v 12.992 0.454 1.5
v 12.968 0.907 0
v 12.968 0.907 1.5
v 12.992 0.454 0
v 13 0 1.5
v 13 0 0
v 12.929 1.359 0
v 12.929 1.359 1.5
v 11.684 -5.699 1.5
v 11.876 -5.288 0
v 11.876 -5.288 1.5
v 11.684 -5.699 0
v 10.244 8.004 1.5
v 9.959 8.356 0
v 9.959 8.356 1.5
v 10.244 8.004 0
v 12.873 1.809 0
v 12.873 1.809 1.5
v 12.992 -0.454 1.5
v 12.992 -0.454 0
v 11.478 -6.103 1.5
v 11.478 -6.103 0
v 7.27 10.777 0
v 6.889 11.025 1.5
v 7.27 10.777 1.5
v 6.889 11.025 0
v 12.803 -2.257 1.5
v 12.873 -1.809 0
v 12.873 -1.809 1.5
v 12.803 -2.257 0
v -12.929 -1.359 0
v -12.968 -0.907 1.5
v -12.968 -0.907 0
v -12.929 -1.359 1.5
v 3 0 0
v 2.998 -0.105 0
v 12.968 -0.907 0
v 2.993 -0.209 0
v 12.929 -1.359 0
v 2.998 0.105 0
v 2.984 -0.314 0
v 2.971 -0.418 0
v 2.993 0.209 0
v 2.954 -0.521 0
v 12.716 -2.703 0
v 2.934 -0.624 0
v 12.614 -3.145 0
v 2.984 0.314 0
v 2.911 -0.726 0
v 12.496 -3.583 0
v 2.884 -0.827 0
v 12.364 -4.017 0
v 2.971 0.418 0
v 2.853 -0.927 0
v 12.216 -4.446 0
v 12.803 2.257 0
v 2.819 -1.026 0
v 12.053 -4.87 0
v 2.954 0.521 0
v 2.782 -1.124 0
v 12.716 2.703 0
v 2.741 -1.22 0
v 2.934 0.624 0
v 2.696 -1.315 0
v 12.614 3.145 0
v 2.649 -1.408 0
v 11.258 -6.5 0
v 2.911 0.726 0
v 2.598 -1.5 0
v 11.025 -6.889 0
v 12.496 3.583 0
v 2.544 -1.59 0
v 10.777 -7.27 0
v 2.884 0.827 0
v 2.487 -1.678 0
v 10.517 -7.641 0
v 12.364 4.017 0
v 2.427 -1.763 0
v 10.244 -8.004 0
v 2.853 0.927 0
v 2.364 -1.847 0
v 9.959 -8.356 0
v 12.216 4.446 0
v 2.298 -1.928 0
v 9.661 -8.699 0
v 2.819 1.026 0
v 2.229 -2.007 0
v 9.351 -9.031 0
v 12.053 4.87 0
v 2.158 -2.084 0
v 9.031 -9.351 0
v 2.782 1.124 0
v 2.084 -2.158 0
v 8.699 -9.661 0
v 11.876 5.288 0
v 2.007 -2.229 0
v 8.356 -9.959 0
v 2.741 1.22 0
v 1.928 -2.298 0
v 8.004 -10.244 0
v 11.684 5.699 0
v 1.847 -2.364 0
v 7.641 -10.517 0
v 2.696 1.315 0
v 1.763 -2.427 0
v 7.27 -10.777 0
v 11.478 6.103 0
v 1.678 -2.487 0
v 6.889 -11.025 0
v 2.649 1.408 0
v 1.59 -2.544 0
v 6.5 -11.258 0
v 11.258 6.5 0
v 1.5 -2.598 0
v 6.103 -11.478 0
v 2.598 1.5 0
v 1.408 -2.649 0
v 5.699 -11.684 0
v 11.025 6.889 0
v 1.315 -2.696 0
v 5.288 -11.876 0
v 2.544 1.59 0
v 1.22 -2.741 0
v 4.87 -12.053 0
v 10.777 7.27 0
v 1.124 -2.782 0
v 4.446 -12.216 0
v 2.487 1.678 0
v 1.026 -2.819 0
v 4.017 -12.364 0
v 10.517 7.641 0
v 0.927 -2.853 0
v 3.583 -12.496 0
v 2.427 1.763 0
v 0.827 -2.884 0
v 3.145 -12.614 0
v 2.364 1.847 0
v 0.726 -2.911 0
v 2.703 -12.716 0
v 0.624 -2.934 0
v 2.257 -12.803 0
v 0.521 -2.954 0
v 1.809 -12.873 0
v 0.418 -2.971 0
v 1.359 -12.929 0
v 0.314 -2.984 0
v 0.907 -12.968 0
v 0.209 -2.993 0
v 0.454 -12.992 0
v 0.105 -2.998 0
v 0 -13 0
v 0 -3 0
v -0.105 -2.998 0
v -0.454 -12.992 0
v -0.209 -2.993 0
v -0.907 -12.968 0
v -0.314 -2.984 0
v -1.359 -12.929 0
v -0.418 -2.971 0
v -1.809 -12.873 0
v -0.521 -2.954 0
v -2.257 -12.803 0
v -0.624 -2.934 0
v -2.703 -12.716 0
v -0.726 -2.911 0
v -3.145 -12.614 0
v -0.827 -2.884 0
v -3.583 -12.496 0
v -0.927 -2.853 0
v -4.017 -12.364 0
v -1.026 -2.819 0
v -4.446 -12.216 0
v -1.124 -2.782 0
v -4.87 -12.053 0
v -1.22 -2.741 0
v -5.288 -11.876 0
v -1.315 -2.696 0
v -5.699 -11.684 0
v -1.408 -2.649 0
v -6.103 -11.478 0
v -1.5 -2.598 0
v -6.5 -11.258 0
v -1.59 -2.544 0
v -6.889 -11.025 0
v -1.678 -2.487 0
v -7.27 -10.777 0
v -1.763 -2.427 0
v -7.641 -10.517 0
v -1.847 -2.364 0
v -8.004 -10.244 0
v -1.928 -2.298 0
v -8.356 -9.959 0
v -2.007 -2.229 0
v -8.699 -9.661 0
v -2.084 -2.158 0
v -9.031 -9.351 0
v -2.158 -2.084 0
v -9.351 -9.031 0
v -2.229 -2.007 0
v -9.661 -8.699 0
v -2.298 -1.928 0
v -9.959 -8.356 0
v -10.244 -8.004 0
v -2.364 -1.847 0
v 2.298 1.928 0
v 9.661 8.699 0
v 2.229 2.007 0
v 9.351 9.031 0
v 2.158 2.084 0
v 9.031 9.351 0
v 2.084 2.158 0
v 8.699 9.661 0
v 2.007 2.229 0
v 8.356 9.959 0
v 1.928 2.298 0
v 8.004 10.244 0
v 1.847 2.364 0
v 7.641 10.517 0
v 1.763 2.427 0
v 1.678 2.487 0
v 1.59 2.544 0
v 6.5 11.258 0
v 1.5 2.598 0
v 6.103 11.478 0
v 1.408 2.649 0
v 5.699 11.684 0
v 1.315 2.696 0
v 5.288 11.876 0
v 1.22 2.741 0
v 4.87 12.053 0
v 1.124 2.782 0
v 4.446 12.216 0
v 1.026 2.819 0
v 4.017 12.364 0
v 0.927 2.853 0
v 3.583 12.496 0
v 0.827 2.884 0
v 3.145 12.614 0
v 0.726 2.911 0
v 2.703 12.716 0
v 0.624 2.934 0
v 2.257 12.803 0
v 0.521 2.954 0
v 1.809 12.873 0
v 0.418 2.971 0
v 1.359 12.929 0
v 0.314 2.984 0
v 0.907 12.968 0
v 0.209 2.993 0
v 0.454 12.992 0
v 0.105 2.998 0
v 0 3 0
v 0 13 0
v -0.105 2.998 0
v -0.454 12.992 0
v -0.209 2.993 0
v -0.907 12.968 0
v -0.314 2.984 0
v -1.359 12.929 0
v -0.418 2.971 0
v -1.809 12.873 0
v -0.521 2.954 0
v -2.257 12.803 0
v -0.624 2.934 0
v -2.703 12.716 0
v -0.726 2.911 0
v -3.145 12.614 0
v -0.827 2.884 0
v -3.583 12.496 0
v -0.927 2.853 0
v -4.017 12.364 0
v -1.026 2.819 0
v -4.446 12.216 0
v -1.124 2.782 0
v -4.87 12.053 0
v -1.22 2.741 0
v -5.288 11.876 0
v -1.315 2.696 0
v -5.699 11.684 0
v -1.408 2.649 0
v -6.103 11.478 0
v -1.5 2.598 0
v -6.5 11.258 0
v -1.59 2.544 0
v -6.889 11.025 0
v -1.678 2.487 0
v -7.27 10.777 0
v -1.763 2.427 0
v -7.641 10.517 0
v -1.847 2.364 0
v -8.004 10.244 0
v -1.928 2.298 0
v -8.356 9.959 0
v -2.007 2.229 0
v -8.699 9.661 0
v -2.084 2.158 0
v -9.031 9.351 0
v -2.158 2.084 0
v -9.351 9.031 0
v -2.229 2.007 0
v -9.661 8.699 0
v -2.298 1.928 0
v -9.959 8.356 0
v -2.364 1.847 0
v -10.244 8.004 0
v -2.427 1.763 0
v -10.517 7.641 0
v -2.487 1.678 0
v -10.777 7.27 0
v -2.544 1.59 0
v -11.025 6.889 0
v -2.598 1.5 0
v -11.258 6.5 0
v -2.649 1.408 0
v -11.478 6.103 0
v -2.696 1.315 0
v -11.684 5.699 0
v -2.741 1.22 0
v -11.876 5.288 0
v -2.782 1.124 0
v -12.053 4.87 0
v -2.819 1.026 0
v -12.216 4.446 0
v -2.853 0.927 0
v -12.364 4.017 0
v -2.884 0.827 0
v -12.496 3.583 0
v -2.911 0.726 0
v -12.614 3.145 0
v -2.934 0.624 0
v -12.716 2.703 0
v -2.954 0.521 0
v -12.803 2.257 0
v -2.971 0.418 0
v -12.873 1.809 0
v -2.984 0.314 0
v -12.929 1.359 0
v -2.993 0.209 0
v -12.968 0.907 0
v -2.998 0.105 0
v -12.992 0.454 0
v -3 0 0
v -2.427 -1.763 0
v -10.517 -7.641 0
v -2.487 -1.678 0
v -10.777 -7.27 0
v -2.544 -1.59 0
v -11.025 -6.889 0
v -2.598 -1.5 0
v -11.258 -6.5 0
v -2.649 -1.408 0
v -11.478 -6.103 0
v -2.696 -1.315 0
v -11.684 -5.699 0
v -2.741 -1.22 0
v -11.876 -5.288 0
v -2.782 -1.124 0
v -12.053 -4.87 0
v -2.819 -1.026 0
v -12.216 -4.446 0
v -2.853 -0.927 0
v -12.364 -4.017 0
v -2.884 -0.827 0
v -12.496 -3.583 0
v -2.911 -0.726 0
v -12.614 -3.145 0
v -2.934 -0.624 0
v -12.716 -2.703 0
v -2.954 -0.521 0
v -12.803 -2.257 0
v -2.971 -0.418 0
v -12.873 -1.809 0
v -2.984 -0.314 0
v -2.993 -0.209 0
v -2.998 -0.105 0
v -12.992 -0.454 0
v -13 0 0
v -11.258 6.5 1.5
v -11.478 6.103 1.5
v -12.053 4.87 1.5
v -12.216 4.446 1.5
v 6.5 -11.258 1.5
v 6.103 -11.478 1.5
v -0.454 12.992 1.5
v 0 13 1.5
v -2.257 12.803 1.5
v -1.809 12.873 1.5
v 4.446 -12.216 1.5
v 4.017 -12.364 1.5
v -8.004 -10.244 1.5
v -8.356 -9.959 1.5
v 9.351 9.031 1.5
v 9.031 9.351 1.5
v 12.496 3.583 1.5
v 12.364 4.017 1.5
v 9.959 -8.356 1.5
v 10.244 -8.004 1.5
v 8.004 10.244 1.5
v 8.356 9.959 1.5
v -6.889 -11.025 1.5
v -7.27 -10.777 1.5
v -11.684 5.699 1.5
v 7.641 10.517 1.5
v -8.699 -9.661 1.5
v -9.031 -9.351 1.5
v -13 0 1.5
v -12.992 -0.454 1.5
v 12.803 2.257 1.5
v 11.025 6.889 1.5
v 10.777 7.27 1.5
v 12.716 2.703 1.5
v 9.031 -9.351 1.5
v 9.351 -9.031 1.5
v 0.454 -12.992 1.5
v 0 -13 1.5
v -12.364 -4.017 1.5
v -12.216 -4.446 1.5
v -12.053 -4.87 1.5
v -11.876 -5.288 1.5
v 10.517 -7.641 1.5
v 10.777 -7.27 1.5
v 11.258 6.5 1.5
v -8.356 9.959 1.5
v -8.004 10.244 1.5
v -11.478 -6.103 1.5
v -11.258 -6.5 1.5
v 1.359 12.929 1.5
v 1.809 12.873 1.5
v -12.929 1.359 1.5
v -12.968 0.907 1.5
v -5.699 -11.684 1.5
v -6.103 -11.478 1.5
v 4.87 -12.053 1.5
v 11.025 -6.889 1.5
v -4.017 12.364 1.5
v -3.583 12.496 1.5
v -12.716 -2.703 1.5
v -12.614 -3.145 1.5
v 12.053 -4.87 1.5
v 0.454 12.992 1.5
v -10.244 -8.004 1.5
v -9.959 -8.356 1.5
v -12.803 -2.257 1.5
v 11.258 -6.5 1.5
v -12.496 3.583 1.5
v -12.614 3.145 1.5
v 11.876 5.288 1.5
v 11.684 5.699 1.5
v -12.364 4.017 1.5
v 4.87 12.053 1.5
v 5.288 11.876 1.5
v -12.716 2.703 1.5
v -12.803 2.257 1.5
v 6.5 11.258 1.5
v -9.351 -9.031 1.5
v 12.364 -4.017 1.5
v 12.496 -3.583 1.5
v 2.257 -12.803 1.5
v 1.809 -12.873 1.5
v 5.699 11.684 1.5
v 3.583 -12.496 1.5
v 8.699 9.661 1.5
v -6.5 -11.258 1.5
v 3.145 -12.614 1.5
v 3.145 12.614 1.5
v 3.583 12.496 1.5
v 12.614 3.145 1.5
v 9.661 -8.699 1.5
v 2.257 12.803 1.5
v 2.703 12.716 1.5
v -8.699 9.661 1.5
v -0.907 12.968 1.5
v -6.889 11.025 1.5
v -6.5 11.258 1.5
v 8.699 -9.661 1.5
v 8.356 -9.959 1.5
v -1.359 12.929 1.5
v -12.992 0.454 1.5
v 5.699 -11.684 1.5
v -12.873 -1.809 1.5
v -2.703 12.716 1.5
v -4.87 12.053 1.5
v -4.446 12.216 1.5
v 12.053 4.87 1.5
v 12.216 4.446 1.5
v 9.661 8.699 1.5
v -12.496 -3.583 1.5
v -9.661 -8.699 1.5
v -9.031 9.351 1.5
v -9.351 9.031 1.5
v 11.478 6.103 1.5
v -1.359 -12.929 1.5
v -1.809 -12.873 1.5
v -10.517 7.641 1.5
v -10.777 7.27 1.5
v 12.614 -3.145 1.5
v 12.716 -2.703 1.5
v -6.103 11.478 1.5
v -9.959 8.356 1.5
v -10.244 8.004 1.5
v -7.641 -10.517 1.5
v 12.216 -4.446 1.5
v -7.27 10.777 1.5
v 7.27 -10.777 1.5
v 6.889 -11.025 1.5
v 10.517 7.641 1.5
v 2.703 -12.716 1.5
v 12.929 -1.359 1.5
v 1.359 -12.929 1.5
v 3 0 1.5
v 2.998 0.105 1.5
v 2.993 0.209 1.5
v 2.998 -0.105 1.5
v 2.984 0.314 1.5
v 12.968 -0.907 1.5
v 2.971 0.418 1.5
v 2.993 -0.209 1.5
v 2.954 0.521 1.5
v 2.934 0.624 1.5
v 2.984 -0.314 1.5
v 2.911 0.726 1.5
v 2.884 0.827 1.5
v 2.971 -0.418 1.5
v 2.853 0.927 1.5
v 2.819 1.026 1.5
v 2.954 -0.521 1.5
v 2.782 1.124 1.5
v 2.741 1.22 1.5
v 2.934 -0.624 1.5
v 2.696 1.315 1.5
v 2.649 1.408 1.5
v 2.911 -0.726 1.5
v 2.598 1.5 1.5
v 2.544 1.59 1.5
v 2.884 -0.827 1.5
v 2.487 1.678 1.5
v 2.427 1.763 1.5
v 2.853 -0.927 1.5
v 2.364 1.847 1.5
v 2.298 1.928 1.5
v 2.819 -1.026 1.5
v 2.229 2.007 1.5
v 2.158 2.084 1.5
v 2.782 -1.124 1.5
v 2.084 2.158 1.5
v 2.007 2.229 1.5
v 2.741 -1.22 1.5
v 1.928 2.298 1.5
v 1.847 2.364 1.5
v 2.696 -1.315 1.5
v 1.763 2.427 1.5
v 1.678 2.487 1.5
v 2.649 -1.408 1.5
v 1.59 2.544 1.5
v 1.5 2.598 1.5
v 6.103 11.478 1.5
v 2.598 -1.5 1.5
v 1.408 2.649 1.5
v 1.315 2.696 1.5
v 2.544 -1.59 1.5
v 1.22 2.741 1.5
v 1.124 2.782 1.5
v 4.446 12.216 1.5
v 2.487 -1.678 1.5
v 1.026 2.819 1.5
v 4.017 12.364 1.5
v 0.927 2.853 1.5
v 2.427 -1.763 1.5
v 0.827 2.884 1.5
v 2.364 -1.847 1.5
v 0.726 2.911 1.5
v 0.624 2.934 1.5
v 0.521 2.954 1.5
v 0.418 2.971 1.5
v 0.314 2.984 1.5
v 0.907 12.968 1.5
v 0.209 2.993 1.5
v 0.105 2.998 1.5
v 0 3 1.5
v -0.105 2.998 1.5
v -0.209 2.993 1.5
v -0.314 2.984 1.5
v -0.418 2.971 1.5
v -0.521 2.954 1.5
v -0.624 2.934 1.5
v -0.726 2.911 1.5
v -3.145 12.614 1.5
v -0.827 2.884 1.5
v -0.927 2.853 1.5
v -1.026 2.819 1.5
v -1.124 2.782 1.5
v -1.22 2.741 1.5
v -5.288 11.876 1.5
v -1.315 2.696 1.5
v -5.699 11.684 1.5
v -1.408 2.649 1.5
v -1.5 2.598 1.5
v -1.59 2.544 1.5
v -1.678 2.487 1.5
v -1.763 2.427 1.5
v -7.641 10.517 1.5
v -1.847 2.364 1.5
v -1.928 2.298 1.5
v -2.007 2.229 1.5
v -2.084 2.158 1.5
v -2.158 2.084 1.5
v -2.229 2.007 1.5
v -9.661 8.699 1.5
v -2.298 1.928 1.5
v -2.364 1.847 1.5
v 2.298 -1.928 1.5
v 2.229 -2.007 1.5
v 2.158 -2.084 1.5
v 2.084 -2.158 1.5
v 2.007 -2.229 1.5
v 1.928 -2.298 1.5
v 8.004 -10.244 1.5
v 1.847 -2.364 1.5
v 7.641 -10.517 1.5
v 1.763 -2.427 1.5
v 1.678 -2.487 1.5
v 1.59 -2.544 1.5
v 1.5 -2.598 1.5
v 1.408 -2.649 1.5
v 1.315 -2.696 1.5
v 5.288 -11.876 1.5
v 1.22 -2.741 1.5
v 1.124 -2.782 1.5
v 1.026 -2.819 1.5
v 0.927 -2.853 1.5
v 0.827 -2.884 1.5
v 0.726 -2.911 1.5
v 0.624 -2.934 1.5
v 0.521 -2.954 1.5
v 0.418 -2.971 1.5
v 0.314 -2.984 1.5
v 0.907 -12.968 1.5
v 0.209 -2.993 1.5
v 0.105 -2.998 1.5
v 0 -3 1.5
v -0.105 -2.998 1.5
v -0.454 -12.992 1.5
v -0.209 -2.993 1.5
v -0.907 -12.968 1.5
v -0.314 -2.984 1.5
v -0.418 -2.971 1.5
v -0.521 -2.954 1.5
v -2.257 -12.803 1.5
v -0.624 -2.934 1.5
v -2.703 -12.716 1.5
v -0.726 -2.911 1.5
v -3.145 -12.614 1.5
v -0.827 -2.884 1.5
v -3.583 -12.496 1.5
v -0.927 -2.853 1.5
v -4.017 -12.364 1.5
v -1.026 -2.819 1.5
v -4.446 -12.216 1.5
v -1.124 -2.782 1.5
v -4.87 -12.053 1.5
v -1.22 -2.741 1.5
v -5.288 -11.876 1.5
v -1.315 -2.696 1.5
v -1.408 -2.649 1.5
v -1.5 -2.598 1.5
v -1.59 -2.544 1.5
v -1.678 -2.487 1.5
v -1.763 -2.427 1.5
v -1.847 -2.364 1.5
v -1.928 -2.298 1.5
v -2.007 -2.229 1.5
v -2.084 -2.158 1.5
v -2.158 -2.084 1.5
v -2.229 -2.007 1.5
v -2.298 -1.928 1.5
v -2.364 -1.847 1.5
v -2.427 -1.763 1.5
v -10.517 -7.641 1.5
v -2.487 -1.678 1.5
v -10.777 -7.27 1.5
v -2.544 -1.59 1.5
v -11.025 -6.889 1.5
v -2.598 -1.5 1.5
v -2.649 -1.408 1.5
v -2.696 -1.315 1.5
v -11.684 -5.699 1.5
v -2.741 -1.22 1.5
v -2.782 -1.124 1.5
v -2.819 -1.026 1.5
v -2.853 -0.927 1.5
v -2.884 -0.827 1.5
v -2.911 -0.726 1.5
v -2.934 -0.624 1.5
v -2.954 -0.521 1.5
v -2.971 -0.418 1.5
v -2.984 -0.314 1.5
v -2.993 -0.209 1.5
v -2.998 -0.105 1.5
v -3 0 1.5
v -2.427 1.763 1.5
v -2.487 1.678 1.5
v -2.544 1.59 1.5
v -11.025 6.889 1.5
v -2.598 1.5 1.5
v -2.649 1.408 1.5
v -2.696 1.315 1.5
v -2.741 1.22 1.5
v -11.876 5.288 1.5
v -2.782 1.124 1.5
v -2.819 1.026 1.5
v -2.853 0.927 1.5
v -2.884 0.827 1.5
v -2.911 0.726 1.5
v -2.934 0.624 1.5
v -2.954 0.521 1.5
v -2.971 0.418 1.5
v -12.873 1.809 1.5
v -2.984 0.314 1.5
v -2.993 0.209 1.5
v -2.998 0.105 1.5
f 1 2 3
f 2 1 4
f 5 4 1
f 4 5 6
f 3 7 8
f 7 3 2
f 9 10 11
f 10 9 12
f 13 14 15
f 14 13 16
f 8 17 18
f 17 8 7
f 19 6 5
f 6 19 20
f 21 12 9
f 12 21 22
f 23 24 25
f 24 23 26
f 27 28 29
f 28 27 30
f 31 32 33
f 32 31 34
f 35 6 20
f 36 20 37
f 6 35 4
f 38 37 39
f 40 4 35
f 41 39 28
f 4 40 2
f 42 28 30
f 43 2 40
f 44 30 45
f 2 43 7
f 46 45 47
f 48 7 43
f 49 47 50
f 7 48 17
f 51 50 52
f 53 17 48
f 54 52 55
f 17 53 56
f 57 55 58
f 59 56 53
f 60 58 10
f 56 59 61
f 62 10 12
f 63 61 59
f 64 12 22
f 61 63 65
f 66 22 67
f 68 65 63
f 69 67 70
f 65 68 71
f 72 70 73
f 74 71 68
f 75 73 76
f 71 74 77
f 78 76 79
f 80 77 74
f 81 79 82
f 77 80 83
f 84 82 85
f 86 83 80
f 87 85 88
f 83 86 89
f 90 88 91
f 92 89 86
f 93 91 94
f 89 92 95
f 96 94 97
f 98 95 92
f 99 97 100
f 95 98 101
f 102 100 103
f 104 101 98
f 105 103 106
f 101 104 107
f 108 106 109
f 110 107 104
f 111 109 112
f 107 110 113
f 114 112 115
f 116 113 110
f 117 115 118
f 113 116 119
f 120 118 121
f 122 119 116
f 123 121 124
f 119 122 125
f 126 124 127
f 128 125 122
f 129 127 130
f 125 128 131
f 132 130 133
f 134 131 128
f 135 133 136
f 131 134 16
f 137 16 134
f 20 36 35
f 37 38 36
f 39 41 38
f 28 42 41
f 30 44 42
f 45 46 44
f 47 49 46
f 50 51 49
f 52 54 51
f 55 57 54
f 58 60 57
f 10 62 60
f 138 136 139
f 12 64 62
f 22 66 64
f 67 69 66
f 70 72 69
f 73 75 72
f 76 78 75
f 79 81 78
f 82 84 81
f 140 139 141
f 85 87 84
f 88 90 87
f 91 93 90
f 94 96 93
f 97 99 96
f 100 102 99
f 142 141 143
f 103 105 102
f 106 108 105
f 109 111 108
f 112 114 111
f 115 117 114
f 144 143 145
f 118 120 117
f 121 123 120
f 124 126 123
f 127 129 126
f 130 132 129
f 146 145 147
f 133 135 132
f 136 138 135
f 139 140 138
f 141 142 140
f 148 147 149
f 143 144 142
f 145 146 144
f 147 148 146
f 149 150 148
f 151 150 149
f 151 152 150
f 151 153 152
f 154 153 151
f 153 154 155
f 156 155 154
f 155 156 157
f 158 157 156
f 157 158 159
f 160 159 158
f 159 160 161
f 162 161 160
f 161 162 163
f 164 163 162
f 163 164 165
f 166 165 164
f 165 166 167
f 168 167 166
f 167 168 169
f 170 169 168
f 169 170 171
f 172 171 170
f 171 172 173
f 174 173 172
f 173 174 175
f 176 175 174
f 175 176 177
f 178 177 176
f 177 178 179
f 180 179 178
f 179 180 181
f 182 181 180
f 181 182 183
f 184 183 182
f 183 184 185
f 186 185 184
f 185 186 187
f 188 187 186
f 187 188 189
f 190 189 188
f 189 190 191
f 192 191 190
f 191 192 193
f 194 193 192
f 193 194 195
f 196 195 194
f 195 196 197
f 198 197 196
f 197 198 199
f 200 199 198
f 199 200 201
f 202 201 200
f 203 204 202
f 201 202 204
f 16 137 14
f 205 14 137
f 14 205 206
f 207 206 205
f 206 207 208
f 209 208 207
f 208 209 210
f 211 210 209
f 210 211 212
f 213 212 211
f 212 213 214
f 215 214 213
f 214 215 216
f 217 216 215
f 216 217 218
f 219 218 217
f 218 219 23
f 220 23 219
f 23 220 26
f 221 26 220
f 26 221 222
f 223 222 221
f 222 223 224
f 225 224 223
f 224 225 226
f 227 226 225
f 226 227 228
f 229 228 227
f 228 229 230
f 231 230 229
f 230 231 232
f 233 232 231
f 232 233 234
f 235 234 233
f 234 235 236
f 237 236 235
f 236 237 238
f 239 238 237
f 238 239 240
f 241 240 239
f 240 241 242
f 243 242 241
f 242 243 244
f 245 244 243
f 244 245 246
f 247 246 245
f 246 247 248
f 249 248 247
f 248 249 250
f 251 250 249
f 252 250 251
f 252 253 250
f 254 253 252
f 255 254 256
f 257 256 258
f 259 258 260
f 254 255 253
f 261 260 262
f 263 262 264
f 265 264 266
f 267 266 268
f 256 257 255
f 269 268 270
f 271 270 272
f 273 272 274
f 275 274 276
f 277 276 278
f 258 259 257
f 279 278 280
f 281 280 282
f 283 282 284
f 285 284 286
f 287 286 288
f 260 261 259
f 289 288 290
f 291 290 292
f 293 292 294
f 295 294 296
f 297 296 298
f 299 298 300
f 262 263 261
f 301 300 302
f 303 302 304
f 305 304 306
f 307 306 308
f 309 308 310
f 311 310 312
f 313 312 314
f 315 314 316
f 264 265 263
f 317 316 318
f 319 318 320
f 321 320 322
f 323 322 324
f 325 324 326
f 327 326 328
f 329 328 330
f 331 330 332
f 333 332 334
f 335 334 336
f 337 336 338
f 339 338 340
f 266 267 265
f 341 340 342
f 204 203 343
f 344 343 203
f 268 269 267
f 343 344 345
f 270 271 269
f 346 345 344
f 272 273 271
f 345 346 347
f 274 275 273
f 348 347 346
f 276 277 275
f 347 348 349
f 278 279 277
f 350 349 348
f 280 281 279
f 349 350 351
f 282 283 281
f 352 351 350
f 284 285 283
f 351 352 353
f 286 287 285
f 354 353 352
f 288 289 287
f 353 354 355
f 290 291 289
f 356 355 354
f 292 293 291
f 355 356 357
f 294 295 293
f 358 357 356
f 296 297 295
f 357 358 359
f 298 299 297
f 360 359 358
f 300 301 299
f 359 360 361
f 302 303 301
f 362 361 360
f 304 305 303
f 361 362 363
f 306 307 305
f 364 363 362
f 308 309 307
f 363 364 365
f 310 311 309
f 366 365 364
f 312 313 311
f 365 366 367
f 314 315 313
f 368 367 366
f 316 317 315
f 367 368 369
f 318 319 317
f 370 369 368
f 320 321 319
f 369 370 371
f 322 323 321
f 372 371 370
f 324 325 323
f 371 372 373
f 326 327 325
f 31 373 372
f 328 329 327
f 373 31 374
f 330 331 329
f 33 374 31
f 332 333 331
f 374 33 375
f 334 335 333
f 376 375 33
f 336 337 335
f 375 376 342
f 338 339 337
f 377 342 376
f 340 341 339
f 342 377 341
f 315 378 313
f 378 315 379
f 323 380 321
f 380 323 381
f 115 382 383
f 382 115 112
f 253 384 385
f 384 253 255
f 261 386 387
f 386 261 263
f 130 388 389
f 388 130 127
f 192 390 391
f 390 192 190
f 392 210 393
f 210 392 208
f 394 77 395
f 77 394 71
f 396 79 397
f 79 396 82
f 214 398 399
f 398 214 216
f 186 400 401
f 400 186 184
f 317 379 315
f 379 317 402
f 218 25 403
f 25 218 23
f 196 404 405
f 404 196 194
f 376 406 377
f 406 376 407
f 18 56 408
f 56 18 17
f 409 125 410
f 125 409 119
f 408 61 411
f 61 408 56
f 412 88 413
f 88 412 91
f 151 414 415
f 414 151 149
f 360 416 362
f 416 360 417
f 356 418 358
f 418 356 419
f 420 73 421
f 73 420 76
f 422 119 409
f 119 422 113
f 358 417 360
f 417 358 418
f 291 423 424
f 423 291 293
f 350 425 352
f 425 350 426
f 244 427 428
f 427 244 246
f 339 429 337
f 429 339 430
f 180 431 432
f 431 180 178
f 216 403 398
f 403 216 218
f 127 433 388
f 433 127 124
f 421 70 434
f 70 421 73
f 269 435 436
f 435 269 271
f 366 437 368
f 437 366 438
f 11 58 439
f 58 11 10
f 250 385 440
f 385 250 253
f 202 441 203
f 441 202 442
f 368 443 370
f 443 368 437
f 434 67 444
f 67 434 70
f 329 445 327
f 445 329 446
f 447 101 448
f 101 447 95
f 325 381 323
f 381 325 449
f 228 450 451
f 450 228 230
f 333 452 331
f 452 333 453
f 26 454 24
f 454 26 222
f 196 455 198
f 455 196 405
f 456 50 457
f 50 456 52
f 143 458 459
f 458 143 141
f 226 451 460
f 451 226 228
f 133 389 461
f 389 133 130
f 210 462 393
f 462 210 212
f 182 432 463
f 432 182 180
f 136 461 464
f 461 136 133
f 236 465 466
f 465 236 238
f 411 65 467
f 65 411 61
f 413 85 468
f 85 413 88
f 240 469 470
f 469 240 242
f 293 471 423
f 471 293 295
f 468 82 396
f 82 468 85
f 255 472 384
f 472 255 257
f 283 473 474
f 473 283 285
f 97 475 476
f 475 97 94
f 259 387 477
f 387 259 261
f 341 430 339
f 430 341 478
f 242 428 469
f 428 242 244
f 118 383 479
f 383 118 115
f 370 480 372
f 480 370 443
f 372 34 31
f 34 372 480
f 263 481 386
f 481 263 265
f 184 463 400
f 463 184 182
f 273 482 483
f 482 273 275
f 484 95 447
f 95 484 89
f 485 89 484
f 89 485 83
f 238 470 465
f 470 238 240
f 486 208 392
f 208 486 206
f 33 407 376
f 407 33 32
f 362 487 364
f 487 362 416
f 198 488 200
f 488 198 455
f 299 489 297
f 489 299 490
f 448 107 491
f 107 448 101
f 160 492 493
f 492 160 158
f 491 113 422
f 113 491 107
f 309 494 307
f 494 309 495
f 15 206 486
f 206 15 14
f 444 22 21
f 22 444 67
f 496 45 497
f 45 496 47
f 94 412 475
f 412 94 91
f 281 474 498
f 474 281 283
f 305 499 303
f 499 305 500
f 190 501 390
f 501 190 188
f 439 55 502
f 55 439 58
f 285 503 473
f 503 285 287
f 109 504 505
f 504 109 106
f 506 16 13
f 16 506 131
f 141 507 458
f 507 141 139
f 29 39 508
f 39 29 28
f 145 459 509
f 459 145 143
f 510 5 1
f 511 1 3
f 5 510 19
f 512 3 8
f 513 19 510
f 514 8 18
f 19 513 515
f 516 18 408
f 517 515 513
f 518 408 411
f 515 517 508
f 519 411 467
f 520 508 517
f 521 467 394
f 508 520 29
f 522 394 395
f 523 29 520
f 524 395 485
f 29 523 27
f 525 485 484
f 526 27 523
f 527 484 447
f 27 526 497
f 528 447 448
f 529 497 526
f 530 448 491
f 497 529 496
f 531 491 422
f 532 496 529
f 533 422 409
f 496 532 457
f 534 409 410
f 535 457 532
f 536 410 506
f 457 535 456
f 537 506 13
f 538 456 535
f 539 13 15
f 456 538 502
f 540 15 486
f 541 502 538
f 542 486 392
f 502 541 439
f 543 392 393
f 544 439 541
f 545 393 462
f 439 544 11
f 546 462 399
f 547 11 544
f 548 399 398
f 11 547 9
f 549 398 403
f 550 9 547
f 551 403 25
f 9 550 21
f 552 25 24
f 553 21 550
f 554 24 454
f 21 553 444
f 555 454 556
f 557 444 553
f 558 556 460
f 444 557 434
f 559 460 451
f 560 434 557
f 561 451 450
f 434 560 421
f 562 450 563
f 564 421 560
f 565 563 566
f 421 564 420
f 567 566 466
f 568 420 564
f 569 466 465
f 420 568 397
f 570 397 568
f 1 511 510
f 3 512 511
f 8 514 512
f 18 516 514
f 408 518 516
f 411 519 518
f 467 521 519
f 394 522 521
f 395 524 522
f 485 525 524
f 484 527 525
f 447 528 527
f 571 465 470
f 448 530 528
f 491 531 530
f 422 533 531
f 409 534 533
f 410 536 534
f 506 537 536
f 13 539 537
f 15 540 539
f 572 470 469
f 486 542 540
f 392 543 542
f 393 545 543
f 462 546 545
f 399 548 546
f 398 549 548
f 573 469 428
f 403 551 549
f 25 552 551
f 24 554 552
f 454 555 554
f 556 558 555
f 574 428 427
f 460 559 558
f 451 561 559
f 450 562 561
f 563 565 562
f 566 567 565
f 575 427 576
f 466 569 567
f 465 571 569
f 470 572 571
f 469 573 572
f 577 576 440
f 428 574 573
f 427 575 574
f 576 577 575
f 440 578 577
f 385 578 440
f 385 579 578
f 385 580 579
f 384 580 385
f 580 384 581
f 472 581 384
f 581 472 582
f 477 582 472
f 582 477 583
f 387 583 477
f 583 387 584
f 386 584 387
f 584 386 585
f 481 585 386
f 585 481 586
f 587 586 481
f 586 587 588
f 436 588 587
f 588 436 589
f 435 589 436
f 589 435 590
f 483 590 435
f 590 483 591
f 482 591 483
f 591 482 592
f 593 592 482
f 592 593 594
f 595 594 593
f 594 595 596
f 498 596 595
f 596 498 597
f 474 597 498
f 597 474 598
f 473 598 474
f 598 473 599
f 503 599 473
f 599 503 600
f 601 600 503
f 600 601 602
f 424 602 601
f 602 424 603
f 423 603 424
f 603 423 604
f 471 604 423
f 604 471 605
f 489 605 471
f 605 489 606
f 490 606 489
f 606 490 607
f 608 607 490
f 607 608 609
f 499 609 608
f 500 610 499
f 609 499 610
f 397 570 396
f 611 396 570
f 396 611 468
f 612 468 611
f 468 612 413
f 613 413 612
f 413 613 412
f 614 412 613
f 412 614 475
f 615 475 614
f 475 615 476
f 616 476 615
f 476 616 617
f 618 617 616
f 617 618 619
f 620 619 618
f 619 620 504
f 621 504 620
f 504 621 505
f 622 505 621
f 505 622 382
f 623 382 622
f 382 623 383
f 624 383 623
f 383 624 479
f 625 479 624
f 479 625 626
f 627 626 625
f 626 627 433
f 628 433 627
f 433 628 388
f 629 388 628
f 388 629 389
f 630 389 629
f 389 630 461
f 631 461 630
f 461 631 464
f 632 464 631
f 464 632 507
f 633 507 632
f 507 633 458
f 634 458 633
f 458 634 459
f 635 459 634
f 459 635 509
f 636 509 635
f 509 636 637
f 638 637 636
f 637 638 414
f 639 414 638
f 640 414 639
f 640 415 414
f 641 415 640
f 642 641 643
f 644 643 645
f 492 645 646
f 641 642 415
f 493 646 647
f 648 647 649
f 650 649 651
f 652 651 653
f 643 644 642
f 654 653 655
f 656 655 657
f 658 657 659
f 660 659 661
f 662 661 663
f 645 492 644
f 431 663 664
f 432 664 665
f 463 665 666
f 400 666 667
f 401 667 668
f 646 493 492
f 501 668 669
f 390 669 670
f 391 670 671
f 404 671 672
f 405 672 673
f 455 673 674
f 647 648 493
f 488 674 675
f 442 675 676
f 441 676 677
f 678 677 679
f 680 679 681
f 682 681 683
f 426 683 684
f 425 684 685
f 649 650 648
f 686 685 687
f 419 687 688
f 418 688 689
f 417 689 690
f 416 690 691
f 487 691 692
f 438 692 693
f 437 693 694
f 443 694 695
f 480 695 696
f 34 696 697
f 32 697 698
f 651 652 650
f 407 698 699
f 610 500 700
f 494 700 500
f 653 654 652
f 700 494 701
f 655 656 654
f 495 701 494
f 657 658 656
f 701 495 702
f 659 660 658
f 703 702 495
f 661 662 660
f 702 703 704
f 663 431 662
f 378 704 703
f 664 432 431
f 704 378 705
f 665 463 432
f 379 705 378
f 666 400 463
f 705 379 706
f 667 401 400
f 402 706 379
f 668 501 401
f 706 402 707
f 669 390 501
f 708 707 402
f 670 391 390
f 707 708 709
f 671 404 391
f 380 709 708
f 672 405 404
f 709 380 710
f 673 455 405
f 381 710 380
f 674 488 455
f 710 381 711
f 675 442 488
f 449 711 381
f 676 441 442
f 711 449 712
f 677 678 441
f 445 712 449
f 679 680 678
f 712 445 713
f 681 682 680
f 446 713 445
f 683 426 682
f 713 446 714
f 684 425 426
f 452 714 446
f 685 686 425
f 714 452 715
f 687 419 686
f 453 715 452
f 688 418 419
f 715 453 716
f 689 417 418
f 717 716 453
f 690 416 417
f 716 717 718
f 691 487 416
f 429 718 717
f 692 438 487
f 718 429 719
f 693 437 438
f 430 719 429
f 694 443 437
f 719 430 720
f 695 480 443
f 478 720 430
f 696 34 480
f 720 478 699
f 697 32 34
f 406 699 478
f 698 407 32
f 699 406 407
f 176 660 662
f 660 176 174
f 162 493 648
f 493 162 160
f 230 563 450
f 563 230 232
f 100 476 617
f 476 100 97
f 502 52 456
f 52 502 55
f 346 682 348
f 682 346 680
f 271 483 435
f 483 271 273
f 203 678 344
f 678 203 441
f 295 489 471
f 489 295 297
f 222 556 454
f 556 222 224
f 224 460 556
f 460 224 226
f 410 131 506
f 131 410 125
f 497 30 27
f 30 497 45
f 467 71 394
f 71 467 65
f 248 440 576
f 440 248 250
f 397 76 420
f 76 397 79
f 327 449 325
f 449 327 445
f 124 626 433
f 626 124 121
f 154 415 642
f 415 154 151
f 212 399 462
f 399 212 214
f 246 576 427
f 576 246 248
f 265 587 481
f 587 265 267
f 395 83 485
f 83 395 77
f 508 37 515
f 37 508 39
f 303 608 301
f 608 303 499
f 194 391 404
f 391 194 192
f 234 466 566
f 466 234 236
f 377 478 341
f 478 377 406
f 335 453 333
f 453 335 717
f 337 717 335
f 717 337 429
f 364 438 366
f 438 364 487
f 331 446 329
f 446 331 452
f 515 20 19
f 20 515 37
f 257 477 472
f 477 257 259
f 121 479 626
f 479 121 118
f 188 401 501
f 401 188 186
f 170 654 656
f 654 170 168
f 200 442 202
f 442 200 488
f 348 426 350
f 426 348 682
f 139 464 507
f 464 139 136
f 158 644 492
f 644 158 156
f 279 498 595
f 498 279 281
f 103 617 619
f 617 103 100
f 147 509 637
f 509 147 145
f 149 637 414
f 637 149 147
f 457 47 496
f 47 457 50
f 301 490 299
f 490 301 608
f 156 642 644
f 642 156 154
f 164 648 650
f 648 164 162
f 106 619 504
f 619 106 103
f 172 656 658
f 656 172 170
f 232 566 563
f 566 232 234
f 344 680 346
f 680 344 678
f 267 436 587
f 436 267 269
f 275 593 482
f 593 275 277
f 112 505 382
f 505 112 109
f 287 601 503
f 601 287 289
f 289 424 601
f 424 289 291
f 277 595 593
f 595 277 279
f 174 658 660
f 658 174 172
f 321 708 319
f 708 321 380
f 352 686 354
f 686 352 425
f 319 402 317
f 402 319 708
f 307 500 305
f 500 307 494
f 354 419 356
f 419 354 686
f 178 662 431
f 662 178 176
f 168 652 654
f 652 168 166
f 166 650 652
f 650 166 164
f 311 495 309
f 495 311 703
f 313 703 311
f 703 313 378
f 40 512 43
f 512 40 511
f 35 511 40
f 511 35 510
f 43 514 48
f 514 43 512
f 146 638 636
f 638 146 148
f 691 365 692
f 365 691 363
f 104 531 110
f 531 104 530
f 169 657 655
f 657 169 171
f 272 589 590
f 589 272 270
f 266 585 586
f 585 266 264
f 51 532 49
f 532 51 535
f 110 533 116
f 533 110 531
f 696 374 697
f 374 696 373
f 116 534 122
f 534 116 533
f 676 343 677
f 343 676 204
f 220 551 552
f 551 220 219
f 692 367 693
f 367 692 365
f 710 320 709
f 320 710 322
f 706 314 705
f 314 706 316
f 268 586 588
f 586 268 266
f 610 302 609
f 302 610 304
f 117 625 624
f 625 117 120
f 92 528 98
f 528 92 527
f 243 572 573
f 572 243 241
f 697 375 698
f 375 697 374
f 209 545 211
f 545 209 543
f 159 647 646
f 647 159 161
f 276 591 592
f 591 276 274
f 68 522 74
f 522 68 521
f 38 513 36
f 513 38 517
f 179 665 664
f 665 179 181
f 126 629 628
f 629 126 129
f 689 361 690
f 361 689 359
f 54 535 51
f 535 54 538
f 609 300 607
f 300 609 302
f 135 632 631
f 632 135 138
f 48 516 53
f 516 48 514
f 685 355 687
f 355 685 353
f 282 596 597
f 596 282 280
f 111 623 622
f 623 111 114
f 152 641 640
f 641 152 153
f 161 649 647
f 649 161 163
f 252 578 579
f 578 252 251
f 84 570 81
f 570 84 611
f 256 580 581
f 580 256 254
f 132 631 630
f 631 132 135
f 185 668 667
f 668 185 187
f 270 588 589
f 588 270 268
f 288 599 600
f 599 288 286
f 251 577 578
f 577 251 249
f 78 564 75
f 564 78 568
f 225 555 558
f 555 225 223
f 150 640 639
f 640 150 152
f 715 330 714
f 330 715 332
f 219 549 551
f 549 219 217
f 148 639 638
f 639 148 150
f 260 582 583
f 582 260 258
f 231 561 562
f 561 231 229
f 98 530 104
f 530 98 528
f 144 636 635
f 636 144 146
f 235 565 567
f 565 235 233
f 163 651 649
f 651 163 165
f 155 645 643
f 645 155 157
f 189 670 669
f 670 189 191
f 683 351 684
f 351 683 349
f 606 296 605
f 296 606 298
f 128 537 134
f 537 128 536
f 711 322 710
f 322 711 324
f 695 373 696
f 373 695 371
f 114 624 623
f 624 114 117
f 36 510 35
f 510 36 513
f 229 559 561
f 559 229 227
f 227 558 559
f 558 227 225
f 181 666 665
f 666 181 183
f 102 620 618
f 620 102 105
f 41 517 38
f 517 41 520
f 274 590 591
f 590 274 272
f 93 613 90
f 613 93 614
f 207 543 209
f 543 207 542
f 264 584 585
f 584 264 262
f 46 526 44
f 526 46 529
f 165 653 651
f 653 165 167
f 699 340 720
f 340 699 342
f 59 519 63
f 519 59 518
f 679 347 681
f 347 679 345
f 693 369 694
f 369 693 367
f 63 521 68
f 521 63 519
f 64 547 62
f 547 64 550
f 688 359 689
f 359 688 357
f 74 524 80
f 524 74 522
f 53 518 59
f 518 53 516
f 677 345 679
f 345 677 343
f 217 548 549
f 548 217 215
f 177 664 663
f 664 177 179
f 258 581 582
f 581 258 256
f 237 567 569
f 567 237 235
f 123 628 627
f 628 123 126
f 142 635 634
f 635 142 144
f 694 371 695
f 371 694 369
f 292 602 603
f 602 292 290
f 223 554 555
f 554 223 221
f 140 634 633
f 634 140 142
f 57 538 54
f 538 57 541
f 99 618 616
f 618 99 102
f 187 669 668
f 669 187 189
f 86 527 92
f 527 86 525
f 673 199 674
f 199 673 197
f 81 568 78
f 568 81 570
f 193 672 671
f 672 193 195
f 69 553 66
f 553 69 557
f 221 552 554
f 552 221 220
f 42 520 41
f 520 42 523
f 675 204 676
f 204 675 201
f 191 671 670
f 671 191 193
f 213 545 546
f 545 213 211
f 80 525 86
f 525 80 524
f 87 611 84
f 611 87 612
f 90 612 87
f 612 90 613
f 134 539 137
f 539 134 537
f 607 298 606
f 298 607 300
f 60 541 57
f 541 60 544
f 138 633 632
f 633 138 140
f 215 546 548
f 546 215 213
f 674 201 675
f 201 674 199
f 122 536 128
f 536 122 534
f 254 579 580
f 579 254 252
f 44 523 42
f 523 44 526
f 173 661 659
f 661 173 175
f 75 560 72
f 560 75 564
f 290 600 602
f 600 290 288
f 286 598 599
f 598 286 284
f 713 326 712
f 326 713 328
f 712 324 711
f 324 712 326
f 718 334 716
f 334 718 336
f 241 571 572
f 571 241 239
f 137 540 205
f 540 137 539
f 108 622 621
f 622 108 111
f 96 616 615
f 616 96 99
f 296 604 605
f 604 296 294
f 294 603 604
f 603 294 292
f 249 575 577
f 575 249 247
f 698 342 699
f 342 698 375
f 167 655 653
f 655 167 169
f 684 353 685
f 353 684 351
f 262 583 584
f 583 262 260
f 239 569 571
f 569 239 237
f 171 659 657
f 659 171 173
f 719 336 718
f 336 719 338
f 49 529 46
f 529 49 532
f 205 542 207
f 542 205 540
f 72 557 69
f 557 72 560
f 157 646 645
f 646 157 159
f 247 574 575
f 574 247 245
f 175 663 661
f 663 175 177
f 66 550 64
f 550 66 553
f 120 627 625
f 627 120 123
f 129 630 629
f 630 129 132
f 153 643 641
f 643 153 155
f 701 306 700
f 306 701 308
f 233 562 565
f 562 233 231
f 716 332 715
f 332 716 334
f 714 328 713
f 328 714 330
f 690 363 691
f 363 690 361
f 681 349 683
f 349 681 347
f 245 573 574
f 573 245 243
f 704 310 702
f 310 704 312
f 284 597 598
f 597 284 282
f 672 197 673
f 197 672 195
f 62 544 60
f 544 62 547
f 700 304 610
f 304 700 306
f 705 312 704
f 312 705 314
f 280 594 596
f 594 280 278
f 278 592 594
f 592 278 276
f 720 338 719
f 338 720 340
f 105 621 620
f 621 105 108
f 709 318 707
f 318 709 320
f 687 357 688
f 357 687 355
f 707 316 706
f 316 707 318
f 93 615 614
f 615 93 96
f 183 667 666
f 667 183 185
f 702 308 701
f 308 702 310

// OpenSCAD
$fn = 180;

inner_d = 6.0;
outer_d = 26.0;
thickness = 1.5;

difference() {
  cylinder(d = outer_d, h = thickness);
  translate([0, 0, -0.1])
    cylinder(d = inner_d, h = thickness + 0.2);
}
